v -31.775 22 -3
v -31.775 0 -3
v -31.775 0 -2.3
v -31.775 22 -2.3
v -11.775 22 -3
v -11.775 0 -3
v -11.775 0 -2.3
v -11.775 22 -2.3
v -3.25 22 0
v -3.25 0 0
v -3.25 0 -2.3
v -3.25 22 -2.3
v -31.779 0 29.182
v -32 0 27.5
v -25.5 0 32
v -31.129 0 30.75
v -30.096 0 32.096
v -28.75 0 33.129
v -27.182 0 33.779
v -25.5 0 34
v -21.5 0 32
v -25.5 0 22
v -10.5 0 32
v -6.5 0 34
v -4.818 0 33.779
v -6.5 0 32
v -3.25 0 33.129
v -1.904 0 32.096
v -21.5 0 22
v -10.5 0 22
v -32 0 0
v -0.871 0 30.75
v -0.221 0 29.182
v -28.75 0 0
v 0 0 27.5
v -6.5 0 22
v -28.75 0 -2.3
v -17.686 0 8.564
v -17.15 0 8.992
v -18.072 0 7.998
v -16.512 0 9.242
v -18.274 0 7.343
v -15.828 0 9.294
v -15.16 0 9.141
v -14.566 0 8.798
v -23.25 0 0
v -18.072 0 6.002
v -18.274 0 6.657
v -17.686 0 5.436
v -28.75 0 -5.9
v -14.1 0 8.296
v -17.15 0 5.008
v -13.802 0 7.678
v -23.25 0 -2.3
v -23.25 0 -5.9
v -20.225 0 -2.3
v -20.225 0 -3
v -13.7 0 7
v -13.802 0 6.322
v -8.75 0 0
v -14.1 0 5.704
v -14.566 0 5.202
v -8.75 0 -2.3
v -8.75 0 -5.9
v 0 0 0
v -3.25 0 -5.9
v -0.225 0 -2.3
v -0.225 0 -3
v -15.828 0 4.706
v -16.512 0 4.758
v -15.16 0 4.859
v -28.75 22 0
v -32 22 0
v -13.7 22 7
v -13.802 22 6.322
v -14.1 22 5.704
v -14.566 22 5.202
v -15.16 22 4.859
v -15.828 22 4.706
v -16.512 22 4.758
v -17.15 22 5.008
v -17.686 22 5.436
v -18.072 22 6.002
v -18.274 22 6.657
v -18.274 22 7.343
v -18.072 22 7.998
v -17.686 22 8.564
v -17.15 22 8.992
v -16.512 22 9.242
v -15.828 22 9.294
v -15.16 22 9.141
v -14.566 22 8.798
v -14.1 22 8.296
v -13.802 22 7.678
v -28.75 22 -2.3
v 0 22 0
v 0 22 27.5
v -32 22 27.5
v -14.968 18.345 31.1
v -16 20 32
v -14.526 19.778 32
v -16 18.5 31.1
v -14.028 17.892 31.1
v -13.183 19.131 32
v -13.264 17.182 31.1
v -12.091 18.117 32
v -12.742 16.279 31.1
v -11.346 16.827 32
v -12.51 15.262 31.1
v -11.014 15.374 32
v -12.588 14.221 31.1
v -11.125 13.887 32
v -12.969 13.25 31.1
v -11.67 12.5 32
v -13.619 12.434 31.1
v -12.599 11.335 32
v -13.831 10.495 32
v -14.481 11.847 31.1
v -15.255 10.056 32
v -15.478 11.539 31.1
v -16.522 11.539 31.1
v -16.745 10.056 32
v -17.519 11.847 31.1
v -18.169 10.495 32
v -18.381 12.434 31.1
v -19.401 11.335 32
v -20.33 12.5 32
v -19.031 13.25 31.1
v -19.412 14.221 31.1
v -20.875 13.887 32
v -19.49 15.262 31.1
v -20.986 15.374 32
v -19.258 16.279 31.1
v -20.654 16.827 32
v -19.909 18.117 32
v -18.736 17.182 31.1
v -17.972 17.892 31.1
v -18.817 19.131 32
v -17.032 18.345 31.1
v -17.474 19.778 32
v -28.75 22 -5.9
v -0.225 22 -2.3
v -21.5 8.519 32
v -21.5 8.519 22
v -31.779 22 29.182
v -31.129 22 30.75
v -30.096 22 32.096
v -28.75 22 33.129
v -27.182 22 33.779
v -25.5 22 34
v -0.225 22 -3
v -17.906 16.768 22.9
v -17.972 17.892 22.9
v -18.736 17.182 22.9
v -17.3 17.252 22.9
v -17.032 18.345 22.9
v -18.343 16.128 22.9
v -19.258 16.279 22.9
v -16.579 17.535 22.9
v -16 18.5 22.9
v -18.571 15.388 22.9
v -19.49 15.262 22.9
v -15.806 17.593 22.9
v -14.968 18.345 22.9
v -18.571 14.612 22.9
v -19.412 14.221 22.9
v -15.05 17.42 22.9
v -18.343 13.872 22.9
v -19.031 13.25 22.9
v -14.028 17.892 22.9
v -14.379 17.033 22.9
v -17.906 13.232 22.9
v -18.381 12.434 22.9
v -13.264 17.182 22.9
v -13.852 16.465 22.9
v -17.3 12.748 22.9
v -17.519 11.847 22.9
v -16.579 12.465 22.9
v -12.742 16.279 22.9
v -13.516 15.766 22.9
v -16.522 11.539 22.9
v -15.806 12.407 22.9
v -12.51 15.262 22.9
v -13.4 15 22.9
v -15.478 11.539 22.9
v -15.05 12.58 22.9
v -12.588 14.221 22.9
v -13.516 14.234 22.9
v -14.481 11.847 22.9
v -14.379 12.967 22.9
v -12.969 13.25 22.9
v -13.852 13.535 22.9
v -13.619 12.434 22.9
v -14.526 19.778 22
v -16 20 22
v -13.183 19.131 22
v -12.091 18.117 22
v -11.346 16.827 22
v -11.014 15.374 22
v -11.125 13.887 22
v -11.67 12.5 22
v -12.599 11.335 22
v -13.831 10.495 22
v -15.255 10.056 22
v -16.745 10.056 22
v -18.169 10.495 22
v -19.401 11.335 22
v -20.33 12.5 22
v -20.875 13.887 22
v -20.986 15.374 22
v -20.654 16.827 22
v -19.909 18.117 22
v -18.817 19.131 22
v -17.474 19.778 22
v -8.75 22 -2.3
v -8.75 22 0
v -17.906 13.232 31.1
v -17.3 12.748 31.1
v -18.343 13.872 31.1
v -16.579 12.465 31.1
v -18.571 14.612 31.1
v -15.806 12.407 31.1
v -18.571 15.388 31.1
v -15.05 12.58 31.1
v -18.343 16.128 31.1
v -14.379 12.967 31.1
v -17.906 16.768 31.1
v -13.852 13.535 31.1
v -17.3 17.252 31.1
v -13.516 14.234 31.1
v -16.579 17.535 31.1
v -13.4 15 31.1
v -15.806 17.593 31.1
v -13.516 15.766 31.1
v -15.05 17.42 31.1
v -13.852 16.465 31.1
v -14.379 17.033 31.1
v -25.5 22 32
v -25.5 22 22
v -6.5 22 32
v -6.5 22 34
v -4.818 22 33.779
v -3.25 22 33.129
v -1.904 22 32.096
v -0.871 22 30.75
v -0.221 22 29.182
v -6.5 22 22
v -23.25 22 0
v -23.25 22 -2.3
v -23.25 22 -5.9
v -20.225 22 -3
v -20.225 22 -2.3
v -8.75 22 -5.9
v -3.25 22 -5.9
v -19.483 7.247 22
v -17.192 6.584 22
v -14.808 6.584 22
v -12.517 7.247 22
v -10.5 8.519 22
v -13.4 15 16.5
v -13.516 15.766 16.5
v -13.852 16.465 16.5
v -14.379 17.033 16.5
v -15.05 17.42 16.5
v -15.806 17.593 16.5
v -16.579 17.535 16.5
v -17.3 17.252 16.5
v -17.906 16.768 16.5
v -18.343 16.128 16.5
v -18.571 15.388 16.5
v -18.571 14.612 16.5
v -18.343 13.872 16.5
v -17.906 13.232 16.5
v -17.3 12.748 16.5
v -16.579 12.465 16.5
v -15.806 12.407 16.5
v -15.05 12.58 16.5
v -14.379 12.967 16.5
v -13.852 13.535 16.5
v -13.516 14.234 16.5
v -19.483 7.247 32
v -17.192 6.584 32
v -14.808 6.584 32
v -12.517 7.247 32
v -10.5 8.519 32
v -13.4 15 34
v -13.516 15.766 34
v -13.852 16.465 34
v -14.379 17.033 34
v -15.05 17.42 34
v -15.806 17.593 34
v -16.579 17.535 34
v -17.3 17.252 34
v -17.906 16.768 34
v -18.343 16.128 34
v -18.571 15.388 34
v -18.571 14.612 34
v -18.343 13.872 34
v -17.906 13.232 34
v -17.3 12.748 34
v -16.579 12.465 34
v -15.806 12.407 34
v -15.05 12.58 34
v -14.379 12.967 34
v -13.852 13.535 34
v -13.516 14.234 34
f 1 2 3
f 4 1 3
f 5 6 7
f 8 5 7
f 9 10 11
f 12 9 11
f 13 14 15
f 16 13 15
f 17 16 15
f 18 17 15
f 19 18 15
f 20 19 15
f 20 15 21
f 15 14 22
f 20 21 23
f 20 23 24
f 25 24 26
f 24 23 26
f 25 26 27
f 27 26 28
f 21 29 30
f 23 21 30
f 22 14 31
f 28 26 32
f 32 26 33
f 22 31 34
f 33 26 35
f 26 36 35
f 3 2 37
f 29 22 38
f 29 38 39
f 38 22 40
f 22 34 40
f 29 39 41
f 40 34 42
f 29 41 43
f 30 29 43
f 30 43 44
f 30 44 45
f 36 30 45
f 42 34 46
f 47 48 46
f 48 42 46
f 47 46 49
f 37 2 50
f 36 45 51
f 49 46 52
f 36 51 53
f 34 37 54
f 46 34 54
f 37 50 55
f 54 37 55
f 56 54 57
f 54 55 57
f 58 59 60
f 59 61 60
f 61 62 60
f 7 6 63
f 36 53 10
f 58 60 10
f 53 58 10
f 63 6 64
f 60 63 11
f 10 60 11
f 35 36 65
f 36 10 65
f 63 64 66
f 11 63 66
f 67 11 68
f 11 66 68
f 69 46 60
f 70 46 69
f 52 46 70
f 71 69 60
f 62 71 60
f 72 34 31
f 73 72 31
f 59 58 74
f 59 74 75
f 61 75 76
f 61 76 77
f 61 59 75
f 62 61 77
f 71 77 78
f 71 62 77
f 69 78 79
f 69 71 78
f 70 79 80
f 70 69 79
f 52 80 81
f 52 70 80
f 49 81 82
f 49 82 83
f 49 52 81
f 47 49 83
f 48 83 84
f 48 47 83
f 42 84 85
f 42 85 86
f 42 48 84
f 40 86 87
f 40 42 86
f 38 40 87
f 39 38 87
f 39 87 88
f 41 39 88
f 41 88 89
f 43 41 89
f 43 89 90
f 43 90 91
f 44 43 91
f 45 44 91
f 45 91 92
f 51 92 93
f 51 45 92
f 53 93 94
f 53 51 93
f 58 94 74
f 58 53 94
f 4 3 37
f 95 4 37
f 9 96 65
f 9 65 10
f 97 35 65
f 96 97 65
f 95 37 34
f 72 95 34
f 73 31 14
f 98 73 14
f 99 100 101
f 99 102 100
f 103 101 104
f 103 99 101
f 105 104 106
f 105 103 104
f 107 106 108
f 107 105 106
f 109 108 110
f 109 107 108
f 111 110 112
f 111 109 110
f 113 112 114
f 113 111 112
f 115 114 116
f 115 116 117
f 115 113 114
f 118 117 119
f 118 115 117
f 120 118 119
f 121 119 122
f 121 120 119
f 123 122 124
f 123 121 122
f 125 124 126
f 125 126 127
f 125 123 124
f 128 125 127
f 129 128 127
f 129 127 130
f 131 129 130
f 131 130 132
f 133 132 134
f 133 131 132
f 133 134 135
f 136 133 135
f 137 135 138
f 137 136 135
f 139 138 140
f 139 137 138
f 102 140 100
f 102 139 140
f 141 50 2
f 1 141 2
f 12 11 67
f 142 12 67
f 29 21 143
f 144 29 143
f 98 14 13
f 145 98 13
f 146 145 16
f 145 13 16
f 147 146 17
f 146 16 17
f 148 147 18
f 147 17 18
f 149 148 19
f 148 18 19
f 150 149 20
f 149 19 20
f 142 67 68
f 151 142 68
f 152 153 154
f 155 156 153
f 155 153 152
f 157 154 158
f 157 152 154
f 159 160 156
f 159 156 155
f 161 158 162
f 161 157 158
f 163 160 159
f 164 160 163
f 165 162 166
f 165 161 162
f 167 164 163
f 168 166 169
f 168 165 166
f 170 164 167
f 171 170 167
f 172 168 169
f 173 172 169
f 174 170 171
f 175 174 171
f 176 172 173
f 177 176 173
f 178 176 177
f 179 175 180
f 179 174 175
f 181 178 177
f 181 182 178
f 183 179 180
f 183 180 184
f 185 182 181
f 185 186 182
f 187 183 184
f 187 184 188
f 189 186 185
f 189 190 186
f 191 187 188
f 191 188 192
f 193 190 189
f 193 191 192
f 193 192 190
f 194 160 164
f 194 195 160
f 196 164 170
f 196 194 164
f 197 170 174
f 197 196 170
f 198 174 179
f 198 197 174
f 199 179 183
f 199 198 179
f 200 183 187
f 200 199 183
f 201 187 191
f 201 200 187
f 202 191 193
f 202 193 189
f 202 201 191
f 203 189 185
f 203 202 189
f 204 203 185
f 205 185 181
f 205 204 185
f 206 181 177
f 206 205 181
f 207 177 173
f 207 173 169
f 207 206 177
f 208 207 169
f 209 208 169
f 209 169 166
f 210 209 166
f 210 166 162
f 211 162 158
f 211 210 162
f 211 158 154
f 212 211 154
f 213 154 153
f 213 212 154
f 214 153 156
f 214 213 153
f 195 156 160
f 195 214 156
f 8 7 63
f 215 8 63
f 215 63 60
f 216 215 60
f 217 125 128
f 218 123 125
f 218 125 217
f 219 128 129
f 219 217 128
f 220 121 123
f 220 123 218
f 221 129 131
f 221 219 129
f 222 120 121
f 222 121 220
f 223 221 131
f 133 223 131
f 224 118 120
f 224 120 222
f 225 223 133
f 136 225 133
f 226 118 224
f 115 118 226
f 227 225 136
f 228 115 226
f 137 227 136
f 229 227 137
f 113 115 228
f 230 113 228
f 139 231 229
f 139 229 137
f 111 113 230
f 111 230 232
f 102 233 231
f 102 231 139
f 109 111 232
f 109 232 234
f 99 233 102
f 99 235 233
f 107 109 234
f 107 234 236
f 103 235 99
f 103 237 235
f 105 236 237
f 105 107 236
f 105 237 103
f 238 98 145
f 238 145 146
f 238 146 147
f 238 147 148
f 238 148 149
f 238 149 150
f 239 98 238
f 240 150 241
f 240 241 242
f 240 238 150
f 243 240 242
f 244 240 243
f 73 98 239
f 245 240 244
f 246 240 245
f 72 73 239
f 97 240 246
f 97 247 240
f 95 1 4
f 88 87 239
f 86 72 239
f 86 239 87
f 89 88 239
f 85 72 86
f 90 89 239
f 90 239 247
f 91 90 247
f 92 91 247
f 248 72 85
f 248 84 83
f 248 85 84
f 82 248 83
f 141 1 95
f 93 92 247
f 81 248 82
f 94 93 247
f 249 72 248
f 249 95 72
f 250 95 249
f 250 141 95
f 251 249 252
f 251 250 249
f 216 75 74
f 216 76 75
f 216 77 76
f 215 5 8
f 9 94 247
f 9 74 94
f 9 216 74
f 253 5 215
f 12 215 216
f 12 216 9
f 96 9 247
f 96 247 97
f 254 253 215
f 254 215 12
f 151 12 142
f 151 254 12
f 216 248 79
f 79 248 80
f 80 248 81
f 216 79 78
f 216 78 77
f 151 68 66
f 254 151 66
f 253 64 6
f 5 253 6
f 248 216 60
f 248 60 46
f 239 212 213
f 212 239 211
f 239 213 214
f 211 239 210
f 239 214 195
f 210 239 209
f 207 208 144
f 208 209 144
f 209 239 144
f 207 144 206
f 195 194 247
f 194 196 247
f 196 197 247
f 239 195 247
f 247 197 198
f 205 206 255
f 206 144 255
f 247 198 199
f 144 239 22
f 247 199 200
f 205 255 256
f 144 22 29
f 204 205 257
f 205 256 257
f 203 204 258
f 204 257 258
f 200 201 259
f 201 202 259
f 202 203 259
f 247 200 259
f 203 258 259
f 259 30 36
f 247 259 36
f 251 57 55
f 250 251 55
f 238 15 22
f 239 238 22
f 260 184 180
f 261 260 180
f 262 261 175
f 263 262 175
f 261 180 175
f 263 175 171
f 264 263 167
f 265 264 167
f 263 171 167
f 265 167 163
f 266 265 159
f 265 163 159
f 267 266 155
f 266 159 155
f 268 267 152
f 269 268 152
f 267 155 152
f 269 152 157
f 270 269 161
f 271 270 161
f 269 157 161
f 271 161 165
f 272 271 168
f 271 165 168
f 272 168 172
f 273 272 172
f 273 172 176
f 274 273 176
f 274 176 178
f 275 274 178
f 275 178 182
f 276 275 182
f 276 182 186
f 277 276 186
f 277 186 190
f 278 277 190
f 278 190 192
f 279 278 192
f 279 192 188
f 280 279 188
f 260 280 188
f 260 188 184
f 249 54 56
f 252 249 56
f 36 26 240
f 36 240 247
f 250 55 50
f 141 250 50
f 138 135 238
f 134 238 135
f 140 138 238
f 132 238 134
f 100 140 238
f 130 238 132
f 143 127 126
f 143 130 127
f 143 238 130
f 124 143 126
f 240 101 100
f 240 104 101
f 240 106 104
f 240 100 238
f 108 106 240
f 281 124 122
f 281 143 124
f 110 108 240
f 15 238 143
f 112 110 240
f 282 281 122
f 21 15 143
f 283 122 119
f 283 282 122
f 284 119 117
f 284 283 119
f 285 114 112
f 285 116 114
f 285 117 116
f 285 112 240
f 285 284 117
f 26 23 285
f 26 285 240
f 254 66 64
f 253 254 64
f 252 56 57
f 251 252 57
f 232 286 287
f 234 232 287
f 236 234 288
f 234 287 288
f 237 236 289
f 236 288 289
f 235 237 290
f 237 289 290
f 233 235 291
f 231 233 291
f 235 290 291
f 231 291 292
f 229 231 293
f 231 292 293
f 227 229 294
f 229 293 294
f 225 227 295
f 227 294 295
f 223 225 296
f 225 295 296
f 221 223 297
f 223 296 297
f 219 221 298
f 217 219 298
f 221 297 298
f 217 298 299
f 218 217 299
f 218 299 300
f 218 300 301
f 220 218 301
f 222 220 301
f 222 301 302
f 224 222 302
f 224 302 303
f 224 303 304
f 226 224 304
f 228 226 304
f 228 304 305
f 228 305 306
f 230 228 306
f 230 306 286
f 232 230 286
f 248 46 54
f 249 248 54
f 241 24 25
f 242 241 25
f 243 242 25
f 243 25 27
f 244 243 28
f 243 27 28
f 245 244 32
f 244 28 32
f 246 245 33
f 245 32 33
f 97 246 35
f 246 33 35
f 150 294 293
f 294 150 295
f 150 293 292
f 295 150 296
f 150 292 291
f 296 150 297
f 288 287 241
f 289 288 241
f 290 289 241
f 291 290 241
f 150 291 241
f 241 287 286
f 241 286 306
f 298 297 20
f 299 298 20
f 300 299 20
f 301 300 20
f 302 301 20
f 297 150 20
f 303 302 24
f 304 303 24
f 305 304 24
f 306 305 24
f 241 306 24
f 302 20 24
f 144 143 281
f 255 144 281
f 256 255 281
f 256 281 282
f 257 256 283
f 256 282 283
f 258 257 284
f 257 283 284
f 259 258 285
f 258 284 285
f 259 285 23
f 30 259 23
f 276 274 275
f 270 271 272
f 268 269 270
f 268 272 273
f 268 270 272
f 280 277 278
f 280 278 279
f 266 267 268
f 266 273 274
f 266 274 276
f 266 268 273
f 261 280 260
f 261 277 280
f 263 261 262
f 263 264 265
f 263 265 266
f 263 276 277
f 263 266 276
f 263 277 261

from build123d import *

# Parameters (mm, degrees)
SKETCH1_R           = 2.3
SKETCH1_W           = 19
SKETCH1_H           = 10
BOSS_EXTRUDE1_DEPTH = 22
BOSS_EXTRUDE2_REACH = 39.9
SKETCH5_R           = 2.6
CUT_EXTRUDE1_DEPTH  = 17.5


with BuildPart() as part:
    # Sketch1 → Boss-Extrude1 (new body)
    with BuildSketch(Plane(origin=(0, 0, 0), x_dir=(1, 0, 0), z_dir=(0, 1, 0))):
        with BuildLine():
            Line((-32, 0), (-32, -27.5))
            ThreePointArc((-32, -27.5), (-30.096194078, -32.096194078), (-25.5, -34))
            Line((-25.5, -34), (-6.5, -34))
            ThreePointArc((-6.5, -34), (-1.903805922, -32.096194078), (0, -27.5))
            Line((0, -27.5), (0, 0))
            Line((0, 0), (-3.25, 0))
            Line((-3.25, 0), (-3.25, 2.3))
            Line((-3.25, 2.3), (-0.225, 2.3))
            Line((-0.225, 2.3), (-0.225, 3))
            Line((-0.225, 3), (-3.25, 5.9))
            Line((-3.25, 5.9), (-8.75, 5.9))
            Line((-8.75, 5.9), (-11.775, 3))
            Line((-11.775, 3), (-11.775, 2.3))
            Line((-11.775, 2.3), (-8.75, 2.3))
            Line((-8.75, 2.3), (-8.75, 0))
            Line((-8.75, 0), (-23.25, 0))
            Line((-23.25, 0), (-23.25, 2.3))
            Line((-23.25, 2.3), (-20.225, 2.3))
            Line((-20.225, 2.3), (-20.225, 3))
            Line((-20.225, 3), (-23.25, 5.9))
            Line((-23.25, 5.9), (-28.75, 5.9))
            Line((-28.75, 5.9), (-31.775, 3))
            Line((-31.775, 3), (-31.775, 2.3))
            Line((-31.775, 2.3), (-28.75, 2.3))
            Line((-28.75, 2.3), (-28.75, 0))
            Line((-28.75, 0), (-32, 0))
        make_face()
        with Locations((-16, -7)):
            Circle(SKETCH1_R, mode=Mode.SUBTRACT)
        with Locations((-16, -27)):
            Rectangle(SKETCH1_W, SKETCH1_H, mode=Mode.SUBTRACT)
    extrude(amount=BOSS_EXTRUDE1_DEPTH)

    # Sketch2 → Boss-Extrude2 (add, up to next)
    with BuildSketch(Plane(origin=(0, 0, 32), x_dir=(-1, 0, 0), z_dir=(0, 0, -1)), mode=Mode.PRIVATE) as boss_extrude2_sk1:
        with BuildLine():
            Line((21.5, 0), (21.5, 8.519259302))
            ThreePointArc((21.5, 8.519259302), (16, 6.5), (10.5, 8.519259302))
            Line((10.5, 8.519259302), (10.5, 0))
            Line((10.5, 0), (21.5, 0))
        make_face()
    boss_extrude2_tool1 = extrude(boss_extrude2_sk1.sketch, amount=BOSS_EXTRUDE2_REACH, mode=Mode.PRIVATE) - part.part
    add(boss_extrude2_tool1.solids().sort_by_distance((-16, 3.593056, 32))[0])

    # Sketch4 → Revolve1 (revolve)
    with BuildSketch(Plane(origin=(-16, 0, 0), x_dir=(0, 0, -1), z_dir=(1, 0, 0))):
        Polygon((-32, 20), (-31.1, 18.5), (-31.1, 15), (-32, 15), align=None)
        Polygon((-22, 15), (-22.9, 15), (-22.9, 18.5), (-22, 20), align=None)
    revolve(axis=Axis((-16, 15, 32), (0, 0, -1)))

    # Sketch5 → Cut-Extrude1 (cut)
    with BuildSketch(Plane.XY.offset(34)):
        with Locations((-16, 15)):
            Circle(SKETCH5_R)
    extrude(amount=-CUT_EXTRUDE1_DEPTH, mode=Mode.SUBTRACT)


solid = part.part
